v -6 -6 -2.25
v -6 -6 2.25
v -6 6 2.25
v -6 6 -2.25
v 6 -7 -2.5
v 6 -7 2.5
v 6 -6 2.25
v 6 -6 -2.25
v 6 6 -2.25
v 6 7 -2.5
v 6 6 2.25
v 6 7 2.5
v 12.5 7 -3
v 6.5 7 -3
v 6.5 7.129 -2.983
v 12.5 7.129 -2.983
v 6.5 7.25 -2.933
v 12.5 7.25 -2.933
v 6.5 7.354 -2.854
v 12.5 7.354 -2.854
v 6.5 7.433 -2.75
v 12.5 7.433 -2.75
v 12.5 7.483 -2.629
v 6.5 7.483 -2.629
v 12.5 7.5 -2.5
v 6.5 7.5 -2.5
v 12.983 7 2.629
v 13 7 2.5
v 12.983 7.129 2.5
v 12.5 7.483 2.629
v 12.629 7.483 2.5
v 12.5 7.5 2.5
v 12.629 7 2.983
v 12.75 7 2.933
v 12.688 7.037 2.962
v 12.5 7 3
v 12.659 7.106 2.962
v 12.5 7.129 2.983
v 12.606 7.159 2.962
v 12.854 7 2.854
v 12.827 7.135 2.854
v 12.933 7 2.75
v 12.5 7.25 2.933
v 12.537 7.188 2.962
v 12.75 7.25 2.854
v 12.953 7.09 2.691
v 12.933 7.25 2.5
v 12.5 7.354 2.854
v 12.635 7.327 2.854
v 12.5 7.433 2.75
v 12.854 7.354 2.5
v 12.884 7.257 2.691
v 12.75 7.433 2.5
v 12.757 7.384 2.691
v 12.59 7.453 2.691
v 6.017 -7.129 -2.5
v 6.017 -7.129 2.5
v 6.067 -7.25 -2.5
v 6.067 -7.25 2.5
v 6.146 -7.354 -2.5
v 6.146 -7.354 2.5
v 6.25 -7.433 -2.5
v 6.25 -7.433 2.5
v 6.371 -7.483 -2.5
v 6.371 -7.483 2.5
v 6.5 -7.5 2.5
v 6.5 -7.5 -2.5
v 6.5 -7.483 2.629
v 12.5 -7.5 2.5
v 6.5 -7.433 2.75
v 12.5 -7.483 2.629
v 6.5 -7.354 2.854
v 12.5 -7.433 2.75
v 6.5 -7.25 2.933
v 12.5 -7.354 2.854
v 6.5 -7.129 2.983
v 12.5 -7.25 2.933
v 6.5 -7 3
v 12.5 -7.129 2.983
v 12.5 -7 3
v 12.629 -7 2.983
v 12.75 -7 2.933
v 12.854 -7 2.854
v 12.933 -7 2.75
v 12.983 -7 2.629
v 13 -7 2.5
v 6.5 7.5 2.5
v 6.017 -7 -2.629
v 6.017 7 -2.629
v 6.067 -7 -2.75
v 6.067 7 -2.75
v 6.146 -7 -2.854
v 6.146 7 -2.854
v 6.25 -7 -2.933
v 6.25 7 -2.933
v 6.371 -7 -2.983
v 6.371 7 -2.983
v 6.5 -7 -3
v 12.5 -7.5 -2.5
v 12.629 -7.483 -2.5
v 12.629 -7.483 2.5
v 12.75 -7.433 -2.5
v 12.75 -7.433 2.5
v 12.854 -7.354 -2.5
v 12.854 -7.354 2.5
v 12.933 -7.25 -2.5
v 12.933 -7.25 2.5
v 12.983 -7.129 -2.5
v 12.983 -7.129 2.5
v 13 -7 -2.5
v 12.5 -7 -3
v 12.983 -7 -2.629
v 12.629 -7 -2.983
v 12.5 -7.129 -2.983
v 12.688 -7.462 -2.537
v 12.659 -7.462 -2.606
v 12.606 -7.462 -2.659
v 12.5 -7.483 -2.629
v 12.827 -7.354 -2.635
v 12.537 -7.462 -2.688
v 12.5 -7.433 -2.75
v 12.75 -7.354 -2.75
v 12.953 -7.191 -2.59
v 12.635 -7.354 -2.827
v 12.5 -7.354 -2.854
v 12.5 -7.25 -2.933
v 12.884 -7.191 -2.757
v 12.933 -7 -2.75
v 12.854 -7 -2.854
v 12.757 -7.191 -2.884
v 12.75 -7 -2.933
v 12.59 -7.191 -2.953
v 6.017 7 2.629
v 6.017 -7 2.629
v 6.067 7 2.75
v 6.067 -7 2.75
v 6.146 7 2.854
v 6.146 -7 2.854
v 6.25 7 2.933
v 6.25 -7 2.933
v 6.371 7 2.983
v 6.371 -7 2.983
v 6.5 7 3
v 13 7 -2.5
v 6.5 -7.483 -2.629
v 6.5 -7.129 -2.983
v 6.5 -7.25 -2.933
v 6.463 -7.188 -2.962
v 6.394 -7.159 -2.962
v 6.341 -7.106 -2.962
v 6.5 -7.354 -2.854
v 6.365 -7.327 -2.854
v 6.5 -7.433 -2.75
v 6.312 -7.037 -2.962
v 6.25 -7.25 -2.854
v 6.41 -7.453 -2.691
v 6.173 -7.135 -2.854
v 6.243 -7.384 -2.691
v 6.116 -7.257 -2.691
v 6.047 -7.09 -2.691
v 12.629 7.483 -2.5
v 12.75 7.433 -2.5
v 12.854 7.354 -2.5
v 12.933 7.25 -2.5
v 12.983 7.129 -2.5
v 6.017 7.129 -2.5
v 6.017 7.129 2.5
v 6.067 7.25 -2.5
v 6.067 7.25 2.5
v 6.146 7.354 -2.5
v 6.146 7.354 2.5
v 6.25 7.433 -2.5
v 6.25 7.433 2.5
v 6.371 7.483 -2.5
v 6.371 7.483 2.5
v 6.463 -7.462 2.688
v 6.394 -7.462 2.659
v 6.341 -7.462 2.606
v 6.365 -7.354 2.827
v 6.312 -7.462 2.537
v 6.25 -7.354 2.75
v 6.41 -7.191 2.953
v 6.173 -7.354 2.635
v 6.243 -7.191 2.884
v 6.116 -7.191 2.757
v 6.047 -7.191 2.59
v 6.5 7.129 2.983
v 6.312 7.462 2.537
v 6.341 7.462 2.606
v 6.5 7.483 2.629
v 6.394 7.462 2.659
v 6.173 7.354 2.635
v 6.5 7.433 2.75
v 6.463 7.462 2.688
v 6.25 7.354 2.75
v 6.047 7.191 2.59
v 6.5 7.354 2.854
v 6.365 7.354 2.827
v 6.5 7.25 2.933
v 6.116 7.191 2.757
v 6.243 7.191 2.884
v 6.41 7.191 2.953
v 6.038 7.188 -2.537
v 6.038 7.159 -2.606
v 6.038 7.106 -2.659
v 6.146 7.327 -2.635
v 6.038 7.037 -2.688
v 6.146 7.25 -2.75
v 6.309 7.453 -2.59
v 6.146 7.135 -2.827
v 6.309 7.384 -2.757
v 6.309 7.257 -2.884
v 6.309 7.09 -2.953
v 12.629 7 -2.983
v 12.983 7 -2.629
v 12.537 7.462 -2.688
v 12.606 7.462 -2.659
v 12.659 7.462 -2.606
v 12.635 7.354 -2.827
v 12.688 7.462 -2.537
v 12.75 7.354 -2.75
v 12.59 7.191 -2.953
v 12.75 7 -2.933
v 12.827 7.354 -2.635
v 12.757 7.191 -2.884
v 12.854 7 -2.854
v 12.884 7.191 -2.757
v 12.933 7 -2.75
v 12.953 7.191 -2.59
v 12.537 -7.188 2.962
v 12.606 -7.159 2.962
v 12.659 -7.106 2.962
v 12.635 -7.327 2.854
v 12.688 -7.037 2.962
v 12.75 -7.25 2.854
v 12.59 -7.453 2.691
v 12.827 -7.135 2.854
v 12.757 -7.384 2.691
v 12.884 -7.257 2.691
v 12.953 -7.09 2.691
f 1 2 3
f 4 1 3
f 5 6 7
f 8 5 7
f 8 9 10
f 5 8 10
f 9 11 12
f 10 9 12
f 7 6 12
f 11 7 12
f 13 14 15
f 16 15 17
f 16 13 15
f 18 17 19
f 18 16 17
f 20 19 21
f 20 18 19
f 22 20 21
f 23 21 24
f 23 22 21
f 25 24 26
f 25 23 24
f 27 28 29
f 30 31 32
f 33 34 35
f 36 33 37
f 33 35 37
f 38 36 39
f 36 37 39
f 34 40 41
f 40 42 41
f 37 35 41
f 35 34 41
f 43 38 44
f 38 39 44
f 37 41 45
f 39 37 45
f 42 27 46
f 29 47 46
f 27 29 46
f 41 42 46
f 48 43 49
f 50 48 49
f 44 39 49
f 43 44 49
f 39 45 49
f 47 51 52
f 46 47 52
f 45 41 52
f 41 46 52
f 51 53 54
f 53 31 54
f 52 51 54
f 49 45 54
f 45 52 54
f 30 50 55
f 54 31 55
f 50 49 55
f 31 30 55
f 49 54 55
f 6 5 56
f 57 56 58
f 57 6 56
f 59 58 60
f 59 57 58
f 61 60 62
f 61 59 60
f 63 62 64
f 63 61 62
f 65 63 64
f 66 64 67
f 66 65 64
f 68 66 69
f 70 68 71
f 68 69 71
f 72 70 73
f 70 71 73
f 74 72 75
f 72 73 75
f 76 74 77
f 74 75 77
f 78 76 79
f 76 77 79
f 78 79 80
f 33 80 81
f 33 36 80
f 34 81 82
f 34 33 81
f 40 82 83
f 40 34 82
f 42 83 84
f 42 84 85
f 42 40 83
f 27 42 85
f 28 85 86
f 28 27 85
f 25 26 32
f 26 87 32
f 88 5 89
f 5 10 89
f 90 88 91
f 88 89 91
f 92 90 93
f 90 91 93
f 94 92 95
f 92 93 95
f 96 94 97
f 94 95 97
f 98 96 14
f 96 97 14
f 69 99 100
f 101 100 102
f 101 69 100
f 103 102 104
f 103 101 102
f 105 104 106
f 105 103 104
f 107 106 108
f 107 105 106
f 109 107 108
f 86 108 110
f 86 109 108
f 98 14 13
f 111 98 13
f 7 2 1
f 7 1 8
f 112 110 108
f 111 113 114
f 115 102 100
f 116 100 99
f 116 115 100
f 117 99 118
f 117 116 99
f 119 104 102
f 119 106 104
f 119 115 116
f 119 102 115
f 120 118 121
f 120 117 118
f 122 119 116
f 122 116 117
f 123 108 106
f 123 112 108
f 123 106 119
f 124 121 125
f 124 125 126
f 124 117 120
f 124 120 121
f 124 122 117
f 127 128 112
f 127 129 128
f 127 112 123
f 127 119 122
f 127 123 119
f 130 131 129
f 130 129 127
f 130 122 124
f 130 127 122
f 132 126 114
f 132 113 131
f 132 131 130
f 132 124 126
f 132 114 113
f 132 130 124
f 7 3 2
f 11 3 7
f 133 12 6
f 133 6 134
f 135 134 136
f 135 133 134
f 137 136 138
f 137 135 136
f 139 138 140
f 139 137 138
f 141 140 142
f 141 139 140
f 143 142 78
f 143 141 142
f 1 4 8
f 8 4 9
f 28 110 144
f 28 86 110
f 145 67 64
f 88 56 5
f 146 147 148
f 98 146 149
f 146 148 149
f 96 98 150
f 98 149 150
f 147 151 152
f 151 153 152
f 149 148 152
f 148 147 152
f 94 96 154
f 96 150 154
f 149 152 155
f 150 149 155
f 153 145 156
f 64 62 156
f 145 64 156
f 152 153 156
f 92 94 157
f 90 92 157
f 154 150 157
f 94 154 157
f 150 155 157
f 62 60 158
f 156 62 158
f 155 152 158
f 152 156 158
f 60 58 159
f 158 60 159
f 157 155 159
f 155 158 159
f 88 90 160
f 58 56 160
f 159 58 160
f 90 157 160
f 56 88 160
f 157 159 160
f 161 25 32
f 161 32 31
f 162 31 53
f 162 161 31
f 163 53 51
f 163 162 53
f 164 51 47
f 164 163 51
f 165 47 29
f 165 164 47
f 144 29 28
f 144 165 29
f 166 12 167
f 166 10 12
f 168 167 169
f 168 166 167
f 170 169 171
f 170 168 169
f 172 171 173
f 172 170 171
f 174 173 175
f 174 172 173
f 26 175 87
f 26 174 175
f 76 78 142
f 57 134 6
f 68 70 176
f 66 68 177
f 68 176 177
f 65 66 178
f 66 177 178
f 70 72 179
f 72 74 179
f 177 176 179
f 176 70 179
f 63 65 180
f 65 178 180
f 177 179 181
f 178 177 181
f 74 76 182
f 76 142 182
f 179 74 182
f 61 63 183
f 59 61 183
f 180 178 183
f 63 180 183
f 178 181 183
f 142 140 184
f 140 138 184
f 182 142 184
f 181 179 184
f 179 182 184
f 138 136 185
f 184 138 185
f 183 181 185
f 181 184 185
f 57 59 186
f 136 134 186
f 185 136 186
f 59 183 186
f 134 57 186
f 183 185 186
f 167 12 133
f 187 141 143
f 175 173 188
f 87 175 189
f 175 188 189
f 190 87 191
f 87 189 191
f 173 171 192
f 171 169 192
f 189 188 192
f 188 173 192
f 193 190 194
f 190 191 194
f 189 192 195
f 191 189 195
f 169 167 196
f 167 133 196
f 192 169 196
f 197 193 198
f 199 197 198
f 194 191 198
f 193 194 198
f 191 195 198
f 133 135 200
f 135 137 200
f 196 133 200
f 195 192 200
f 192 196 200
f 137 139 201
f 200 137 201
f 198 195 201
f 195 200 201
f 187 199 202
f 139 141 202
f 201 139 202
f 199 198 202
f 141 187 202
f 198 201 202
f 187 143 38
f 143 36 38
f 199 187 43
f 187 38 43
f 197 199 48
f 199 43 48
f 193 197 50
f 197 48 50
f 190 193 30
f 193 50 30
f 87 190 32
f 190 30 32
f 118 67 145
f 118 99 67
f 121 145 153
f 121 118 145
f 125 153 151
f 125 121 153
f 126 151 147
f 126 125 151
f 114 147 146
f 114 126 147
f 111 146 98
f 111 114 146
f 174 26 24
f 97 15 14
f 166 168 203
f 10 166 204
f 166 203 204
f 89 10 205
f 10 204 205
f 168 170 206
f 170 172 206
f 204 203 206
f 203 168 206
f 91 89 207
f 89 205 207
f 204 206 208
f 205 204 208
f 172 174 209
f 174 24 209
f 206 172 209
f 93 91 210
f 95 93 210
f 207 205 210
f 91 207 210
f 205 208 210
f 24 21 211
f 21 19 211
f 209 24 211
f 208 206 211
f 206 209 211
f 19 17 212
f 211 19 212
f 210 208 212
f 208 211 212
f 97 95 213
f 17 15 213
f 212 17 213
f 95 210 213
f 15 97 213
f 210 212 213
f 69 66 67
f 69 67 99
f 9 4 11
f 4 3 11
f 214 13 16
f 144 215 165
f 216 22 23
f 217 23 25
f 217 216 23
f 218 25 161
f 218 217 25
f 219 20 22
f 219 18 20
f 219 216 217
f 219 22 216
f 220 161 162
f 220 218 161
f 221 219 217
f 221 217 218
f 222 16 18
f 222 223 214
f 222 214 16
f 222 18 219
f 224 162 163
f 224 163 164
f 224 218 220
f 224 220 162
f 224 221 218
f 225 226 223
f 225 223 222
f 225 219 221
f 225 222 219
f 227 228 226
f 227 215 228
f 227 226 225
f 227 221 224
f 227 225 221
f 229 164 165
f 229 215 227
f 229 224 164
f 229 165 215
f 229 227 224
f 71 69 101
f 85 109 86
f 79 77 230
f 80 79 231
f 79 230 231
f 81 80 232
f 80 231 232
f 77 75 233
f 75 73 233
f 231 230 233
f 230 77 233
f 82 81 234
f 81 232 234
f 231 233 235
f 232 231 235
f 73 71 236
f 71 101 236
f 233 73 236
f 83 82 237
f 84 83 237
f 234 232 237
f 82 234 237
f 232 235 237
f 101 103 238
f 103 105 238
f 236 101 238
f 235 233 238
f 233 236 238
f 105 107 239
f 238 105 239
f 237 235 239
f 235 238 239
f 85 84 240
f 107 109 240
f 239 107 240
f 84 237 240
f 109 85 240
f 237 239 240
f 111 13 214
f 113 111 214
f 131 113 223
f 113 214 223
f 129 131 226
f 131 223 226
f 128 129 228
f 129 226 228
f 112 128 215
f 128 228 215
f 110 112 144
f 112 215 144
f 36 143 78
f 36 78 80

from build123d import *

# Parameters (mm, degrees)
SKETCH1_W           = 12
SKETCH1_H           = 12
BOSS_EXTRUDE1_DEPTH = 2.25
SKETCH1_3_W         = 7
SKETCH1_3_H         = 15
BOSS_EXTRUDE2_DEPTH = 3
FILLET1_R           = 0.5


with BuildPart() as part:
    # Sketch1 → Boss-Extrude1 (new, symmetric)
    with BuildSketch(Plane.XY):
        Rectangle(SKETCH1_W, SKETCH1_H)
    extrude(amount=BOSS_EXTRUDE1_DEPTH, both=True)

    # Sketch1<3> → Boss-Extrude2 (add, symmetric)
    with BuildSketch(Plane.XY):
        with Locations((9.5, 0)):
            Rectangle(SKETCH1_3_W, SKETCH1_3_H)
    extrude(amount=BOSS_EXTRUDE2_DEPTH, both=True)

    # Fillet1
    fillet1_edges = [part.edges().sort_by_distance(p)[0] for p in [
        (13, 0, -3),
        (13, -7.5, 0),
        (9.5, 7.5, -3),
        (13, 7.5, 0),
        (6, 0, 3),
        (6, 7.5, 0),
        (9.5, -7.5, 3),
        (6, -7.5, 0),
        (13, 0, 3),
        (9.5, 7.5, 3),
        (9.5, -7.5, -3),
        (6, 0, -3),
    ]]
    fillet(fillet1_edges, radius=FILLET1_R)


solid = part.part
